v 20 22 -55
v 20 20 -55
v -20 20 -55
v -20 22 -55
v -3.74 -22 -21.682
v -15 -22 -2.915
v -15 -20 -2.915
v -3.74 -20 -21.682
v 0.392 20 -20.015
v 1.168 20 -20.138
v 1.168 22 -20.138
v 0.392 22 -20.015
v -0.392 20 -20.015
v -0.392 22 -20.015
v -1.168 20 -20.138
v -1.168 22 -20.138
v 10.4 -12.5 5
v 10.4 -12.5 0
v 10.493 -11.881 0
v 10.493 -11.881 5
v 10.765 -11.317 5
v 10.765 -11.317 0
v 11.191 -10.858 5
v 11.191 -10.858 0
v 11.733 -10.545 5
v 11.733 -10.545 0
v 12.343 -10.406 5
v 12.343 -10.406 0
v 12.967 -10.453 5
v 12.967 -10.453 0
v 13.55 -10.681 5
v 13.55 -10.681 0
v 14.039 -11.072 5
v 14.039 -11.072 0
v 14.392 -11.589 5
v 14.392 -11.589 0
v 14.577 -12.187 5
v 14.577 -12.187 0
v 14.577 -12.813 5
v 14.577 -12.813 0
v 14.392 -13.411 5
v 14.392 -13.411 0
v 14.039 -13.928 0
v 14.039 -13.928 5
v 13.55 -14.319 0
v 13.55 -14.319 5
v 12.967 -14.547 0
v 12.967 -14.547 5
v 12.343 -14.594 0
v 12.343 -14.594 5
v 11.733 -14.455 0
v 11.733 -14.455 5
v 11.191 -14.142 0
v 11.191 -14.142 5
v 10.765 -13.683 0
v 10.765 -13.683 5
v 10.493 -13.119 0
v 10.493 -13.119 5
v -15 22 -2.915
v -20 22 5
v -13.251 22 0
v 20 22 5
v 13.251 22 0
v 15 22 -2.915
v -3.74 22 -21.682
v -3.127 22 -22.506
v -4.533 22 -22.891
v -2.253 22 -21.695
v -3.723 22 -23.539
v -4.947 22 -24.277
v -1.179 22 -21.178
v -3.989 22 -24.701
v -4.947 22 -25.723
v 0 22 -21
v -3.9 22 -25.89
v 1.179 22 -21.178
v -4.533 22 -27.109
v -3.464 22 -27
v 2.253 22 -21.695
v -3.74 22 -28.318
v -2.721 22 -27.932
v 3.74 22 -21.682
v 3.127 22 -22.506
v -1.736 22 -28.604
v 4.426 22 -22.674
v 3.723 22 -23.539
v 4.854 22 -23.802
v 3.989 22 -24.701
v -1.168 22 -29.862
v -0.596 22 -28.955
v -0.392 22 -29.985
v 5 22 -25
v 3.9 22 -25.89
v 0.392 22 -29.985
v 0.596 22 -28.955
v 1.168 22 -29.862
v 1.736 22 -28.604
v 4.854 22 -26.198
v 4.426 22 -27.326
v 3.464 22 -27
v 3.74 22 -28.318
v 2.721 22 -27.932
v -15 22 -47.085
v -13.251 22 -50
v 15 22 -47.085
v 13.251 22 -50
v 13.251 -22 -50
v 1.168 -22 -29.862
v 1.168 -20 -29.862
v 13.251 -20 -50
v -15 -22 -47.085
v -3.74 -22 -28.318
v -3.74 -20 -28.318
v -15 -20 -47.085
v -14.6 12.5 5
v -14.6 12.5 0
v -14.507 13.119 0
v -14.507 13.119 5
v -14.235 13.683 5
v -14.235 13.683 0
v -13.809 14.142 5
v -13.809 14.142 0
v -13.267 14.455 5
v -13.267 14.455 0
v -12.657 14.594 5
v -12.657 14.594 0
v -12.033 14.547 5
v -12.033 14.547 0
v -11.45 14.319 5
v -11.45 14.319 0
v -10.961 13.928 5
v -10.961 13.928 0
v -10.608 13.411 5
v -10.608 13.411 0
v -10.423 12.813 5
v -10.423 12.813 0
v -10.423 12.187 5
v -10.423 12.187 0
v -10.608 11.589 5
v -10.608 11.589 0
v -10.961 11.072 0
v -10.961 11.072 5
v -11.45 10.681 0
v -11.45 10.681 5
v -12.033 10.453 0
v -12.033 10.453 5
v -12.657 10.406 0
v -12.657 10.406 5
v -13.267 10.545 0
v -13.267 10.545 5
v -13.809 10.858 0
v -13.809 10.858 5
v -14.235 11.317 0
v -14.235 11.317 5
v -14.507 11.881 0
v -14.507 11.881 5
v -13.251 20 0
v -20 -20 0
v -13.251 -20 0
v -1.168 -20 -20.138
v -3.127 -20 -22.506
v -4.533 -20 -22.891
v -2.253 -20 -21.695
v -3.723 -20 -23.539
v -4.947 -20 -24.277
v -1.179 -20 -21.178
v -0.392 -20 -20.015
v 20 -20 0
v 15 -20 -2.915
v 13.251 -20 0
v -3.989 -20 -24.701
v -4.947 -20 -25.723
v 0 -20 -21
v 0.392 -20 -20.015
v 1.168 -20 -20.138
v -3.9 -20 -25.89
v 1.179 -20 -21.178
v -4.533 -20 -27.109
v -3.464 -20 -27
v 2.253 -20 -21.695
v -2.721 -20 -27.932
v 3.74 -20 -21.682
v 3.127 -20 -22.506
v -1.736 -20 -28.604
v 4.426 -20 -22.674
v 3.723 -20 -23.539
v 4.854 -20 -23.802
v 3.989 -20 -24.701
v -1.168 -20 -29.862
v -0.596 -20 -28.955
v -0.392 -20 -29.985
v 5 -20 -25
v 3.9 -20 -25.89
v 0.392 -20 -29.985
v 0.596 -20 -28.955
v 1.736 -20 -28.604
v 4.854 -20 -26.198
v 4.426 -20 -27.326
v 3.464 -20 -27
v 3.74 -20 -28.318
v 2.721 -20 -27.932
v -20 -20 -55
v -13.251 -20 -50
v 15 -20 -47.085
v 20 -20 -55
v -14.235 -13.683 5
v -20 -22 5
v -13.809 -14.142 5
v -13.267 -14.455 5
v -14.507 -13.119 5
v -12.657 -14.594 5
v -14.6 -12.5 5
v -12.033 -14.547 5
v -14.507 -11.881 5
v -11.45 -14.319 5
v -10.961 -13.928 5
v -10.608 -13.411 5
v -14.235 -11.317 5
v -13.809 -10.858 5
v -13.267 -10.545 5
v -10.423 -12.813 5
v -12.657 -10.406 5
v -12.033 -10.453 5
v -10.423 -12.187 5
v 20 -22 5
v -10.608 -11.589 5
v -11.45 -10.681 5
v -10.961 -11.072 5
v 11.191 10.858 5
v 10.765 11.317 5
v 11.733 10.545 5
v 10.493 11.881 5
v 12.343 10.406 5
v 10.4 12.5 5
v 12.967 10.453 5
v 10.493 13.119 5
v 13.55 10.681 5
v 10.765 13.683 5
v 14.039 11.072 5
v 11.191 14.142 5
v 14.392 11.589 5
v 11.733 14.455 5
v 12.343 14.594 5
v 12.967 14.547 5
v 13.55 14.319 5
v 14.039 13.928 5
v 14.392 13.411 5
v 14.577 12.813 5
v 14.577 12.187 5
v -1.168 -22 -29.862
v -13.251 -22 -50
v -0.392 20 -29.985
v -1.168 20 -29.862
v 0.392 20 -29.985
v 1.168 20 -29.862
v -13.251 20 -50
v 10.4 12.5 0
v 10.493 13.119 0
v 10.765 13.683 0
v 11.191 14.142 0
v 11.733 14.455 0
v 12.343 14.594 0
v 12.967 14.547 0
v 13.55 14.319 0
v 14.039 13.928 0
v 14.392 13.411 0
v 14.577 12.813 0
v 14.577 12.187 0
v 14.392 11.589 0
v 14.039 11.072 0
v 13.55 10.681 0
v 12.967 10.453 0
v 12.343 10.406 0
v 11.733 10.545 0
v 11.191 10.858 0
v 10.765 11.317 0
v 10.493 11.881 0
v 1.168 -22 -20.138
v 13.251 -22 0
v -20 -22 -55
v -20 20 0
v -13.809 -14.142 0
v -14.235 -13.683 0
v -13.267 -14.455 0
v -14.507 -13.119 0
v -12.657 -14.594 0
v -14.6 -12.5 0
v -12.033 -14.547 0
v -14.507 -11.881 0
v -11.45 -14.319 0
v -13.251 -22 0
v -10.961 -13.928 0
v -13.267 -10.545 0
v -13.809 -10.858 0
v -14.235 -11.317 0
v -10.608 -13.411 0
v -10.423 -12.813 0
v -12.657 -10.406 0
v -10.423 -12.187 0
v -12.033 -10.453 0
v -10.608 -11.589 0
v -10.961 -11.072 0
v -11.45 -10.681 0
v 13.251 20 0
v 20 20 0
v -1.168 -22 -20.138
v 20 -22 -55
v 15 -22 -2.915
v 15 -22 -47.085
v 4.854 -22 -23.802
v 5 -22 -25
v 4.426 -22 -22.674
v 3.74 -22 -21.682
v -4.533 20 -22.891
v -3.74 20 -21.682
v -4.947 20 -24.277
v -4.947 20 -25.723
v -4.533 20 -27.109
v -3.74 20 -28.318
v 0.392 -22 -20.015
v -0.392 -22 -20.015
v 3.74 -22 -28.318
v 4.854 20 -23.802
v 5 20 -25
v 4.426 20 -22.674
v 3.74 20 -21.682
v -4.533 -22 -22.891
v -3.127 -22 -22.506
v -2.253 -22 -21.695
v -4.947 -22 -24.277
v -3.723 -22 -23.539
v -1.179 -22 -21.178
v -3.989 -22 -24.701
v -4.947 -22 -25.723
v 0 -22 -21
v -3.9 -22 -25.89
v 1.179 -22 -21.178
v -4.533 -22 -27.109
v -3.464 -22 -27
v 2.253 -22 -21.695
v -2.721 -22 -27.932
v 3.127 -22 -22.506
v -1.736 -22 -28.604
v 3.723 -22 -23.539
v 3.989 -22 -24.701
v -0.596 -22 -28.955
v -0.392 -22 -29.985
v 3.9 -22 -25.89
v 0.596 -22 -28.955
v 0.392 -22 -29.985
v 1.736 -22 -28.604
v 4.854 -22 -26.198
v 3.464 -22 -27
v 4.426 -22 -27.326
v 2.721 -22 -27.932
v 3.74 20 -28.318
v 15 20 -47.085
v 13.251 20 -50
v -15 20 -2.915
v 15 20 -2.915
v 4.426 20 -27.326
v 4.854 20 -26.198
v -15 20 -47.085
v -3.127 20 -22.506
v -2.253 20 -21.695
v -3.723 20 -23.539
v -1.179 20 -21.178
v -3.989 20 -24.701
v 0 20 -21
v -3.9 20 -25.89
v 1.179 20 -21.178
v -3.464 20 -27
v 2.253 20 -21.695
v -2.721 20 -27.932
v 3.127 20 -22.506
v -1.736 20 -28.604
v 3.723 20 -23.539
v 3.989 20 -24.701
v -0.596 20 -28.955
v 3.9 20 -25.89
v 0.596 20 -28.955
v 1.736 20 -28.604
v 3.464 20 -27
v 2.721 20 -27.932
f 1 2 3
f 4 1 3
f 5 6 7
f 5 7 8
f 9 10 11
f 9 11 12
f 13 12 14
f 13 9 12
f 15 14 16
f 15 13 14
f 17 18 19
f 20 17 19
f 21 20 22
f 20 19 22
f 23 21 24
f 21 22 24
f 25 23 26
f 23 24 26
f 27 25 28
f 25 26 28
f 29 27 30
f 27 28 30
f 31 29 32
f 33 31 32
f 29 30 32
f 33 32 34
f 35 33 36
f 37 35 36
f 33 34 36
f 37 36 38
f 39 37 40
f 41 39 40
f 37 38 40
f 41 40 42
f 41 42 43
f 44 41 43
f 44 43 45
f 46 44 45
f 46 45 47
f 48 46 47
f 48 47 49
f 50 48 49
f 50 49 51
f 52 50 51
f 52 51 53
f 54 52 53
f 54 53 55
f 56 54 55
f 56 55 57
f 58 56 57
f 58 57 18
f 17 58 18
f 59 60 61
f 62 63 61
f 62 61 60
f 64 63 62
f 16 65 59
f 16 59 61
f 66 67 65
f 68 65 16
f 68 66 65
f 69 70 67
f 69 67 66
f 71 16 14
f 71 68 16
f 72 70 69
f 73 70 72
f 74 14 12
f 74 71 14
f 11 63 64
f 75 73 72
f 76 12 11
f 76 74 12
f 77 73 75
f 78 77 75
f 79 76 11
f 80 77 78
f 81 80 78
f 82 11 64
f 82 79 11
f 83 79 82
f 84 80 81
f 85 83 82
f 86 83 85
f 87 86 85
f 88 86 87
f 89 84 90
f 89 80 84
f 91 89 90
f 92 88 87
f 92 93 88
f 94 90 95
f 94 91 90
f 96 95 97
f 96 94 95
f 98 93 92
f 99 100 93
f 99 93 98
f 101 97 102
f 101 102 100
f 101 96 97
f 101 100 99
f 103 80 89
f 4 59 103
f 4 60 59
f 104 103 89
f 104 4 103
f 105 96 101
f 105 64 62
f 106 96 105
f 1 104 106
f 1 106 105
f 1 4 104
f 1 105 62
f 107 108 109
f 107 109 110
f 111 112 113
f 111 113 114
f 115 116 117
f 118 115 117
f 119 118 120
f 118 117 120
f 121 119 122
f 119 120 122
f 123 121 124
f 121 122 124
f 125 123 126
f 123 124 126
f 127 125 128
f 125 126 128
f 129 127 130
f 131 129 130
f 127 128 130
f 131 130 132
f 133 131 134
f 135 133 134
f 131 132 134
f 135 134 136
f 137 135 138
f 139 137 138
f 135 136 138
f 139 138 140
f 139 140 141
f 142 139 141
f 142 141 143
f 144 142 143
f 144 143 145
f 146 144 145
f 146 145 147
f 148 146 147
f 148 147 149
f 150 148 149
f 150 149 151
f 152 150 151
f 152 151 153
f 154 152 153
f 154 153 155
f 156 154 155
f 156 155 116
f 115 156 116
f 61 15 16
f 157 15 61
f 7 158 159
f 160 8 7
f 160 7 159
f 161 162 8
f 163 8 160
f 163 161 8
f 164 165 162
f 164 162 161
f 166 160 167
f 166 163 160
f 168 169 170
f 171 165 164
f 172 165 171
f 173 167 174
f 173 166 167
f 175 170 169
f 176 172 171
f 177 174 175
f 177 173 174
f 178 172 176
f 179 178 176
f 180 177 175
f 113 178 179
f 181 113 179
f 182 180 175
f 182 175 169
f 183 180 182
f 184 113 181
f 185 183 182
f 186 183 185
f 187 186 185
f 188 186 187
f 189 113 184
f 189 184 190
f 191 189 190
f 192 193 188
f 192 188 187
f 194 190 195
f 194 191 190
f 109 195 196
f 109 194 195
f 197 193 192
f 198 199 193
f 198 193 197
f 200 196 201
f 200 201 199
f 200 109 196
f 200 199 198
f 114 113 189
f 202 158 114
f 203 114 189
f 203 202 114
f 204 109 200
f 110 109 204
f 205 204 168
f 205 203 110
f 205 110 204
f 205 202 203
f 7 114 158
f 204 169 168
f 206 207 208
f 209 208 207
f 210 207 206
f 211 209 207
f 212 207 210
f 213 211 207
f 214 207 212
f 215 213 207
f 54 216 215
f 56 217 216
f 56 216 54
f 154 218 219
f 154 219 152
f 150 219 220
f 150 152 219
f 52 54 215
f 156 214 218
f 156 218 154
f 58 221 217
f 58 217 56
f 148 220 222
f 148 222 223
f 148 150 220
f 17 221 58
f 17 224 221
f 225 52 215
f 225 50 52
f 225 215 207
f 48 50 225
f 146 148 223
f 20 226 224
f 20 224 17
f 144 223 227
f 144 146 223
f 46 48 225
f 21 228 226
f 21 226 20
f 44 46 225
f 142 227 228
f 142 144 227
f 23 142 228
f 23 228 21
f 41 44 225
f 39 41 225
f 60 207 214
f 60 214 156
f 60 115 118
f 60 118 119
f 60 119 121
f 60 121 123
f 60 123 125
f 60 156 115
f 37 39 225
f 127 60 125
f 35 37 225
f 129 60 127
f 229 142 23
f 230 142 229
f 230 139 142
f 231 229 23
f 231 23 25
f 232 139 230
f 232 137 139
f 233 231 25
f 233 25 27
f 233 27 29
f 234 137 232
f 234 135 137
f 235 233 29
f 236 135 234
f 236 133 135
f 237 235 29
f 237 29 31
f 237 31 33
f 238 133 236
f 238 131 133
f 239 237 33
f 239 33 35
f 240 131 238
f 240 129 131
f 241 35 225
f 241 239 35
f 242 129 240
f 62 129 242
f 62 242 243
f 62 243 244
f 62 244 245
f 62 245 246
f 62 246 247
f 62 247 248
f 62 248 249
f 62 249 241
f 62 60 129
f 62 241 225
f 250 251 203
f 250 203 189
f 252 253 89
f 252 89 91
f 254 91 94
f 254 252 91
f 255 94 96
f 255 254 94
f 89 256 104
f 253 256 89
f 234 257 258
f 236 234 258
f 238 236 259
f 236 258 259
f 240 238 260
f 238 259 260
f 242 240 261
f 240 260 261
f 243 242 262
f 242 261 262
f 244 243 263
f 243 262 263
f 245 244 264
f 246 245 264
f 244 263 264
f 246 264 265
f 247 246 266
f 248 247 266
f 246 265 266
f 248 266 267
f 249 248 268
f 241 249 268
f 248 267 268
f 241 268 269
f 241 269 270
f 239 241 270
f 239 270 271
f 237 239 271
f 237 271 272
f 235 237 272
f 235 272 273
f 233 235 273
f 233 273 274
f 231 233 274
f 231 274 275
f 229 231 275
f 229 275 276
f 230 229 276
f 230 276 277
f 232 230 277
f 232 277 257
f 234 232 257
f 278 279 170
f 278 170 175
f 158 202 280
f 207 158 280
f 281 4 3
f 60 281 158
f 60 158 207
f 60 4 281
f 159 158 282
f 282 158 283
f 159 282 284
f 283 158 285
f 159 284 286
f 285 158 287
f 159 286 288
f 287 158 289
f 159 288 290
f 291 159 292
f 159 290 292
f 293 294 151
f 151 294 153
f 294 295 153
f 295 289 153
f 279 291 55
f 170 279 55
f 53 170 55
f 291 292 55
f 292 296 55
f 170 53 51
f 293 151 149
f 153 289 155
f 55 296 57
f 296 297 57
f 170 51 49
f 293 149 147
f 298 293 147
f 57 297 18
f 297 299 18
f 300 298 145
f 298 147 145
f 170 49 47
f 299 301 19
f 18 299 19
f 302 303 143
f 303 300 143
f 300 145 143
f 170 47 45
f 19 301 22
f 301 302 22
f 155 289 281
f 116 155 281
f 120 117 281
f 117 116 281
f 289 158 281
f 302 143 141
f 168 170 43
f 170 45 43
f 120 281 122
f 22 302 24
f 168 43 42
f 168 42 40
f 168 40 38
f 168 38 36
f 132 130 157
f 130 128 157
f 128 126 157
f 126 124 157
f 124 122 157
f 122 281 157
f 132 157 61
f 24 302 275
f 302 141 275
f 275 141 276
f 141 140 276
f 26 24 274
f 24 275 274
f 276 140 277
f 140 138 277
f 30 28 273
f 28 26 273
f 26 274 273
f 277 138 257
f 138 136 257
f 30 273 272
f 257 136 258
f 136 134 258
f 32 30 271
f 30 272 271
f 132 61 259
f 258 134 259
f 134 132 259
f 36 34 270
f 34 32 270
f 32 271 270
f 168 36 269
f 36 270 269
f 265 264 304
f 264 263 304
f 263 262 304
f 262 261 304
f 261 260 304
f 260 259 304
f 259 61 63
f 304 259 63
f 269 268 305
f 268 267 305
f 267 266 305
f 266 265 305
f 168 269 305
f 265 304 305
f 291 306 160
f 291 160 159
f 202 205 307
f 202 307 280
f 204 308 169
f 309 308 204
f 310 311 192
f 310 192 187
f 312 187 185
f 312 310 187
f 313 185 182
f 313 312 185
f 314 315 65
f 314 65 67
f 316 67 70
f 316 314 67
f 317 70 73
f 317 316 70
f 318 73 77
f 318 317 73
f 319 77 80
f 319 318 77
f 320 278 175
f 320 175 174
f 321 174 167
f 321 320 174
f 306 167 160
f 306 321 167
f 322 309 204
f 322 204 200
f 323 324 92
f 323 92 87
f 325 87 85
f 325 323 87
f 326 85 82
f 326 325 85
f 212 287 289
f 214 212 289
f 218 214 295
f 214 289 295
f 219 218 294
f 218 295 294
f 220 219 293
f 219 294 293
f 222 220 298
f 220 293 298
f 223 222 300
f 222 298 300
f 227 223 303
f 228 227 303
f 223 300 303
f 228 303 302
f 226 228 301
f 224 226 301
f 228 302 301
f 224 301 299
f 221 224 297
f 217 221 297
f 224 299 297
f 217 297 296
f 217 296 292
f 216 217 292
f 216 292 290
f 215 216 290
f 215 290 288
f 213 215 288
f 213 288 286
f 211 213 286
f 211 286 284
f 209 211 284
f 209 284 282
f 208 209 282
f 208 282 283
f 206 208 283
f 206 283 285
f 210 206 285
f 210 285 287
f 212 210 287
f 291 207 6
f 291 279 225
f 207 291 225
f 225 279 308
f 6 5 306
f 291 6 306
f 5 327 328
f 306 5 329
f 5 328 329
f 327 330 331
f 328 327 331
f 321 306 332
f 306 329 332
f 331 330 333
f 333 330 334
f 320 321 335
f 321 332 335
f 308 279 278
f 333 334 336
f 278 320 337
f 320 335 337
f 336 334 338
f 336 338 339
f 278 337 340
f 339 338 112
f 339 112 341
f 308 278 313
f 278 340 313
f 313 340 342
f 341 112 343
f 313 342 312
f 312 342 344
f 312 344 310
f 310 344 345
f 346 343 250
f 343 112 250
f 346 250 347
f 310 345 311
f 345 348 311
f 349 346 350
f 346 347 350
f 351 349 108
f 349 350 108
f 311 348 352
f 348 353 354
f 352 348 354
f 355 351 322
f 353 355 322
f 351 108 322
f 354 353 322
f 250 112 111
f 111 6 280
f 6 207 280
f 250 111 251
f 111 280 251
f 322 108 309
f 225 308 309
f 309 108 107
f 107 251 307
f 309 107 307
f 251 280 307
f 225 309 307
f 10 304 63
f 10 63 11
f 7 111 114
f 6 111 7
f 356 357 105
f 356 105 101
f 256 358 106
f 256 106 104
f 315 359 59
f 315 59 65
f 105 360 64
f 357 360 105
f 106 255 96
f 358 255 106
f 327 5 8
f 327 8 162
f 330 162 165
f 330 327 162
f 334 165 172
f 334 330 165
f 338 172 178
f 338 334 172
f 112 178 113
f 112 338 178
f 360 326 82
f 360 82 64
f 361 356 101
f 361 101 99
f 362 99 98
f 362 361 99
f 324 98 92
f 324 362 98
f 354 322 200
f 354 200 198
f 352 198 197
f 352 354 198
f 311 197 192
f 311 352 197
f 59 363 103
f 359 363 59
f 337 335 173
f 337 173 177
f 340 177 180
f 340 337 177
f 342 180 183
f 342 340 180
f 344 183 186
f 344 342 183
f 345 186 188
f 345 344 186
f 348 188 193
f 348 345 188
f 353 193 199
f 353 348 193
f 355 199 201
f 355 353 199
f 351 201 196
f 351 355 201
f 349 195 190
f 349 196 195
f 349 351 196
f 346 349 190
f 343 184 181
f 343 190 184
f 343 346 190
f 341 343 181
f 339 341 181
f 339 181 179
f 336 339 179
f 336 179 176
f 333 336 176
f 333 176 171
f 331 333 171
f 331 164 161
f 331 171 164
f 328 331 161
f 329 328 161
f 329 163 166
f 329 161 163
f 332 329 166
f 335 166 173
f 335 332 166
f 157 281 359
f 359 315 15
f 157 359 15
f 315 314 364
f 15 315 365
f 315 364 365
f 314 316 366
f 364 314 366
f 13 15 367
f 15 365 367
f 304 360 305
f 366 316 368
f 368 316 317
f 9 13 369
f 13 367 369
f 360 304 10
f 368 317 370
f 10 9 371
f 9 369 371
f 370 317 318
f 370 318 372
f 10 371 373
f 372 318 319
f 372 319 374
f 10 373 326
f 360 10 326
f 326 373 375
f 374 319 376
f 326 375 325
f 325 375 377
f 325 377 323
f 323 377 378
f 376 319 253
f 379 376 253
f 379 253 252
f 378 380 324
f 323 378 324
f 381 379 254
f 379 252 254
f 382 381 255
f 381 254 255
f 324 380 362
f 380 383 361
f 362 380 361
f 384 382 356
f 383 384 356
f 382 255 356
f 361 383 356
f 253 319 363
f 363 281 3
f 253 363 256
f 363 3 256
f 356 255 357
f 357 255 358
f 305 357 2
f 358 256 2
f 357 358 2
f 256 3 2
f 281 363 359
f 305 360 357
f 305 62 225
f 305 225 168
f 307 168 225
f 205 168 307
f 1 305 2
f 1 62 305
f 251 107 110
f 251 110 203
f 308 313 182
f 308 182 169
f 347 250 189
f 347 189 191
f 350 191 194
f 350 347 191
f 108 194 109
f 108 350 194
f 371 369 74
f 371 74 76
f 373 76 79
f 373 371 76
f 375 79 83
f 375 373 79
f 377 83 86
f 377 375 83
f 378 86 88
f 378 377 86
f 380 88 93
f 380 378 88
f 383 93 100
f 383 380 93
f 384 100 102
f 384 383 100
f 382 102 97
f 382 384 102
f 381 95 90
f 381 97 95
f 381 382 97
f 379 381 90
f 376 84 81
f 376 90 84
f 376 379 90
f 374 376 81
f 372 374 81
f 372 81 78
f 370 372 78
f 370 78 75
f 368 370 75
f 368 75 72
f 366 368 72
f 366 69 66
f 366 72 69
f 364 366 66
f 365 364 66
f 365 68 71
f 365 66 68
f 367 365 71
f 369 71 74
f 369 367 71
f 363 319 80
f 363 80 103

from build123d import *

# Parameters (mm, degrees)
SKETCH_2_W               = 40
SKETCH_2_H               = 40
EXTRUDE_1_DEPTH          = 5
EXTRUDE_2_DEPTH          = 2
HOLE_WIZARD_M5_1_D       = 4.2
HOLE_WIZARD_M5_1_DEPTH   = 12.4
HOLE_WIZARD_M5_1_TIP     = 1.2618073
CUT_EXTRUDE_5_DEPTH      = 74.218850032
CUT_EXTRUDE_5_DEPTH_BACK = 74.218850032
SKETCH_4_R               = 4


with BuildPart() as part:
    # 草图2 → 凸台-拉伸1 (new body)
    with BuildSketch(Plane.XY):
        Rectangle(SKETCH_2_W, SKETCH_2_H)
    extrude(amount=EXTRUDE_1_DEPTH)

    # 草图3 → 凸台-拉伸2 (add)
    with BuildSketch(Plane(origin=(0, 20, 0), x_dir=(1, 0, 0), z_dir=(0, 1, 0))):
        Polygon((20, 0), (20, 55), (-20, 55), (-20, 0), (-20, -5), (20, -5), align=None)
    extrude_2 = extrude(amount=EXTRUDE_2_DEPTH)

    # 镜向1: 凸台-拉伸2 across plane
    add(extrude_2.mirror(Plane.ZX))

    # M5 螺纹孔1
    with Locations(Plane(origin=(-12.5, 12.5, 5), x_dir=(1, 0, 0), z_dir=(0, 0, 1))):
        with Locations((0, 0), (25, 0), (25, -25), (0, -25)):
            Hole(HOLE_WIZARD_M5_1_D / 2, depth=HOLE_WIZARD_M5_1_DEPTH)
            with Locations((0, 0, -(HOLE_WIZARD_M5_1_DEPTH + HOLE_WIZARD_M5_1_TIP / 2))):  # 118° drill point
                Cone(0, HOLE_WIZARD_M5_1_D / 2, HOLE_WIZARD_M5_1_TIP, mode=Mode.SUBTRACT)

    # 草图4 → 切除-拉伸5 (cut, two sides: drawn at the far end of the back side and taken through both)
    with BuildSketch(Plane(origin=(0, -22, 0), x_dir=(1, 0, 0), z_dir=(0, 1, 0)).offset(-CUT_EXTRUDE_5_DEPTH_BACK)):
        with BuildLine():
            Line((13.250714432, 50), (-13.250714432, 50))
            Line((-13.250714432, 50), (-1.167748962, 29.861724217))
            ThreePointArc((-1.167748962, 29.861724217), (0, 30), (1.167748962, 29.861724217))
            Line((1.167748962, 29.861724217), (13.250714432, 50))
        make_face()
        with BuildLine():
            Line((15, 2.915475947), (15, 47.084524053))
            Line((15, 47.084524053), (3.740227739, 28.318236951))
            ThreePointArc((3.740227739, 28.318236951), (4.674459257, 26.774663532), (5, 25))
            ThreePointArc((5, 25), (4.674459257, 23.225336468), (3.740227739, 21.681763049))
            Line((3.740227739, 21.681763049), (15, 2.915475947))
        make_face()
        with BuildLine():
            Line((-3.740227739, 28.318236951), (-15, 47.084524053))
            Line((-15, 47.084524053), (-15, 2.915475947))
            Line((-15, 2.915475947), (-3.740227739, 21.681763049))
            ThreePointArc((-3.740227739, 21.681763049), (-5, 25), (-3.740227739, 28.318236951))
        make_face()
        with BuildLine():
            Line((-1.167748962, 20.138275783), (-13.250714432, 0))
            Line((-13.250714432, 0), (13.250714432, 0))
            Line((13.250714432, 0), (1.167748962, 20.138275783))
            ThreePointArc((1.167748962, 20.138275783), (0, 20), (-1.167748962, 20.138275783))
        make_face()
        with Locations(Location((0, 25, 0), (0, 0, 270))):
            Circle(SKETCH_4_R)
    extrude(amount=CUT_EXTRUDE_5_DEPTH + CUT_EXTRUDE_5_DEPTH_BACK, mode=Mode.SUBTRACT)


solid = part.part
